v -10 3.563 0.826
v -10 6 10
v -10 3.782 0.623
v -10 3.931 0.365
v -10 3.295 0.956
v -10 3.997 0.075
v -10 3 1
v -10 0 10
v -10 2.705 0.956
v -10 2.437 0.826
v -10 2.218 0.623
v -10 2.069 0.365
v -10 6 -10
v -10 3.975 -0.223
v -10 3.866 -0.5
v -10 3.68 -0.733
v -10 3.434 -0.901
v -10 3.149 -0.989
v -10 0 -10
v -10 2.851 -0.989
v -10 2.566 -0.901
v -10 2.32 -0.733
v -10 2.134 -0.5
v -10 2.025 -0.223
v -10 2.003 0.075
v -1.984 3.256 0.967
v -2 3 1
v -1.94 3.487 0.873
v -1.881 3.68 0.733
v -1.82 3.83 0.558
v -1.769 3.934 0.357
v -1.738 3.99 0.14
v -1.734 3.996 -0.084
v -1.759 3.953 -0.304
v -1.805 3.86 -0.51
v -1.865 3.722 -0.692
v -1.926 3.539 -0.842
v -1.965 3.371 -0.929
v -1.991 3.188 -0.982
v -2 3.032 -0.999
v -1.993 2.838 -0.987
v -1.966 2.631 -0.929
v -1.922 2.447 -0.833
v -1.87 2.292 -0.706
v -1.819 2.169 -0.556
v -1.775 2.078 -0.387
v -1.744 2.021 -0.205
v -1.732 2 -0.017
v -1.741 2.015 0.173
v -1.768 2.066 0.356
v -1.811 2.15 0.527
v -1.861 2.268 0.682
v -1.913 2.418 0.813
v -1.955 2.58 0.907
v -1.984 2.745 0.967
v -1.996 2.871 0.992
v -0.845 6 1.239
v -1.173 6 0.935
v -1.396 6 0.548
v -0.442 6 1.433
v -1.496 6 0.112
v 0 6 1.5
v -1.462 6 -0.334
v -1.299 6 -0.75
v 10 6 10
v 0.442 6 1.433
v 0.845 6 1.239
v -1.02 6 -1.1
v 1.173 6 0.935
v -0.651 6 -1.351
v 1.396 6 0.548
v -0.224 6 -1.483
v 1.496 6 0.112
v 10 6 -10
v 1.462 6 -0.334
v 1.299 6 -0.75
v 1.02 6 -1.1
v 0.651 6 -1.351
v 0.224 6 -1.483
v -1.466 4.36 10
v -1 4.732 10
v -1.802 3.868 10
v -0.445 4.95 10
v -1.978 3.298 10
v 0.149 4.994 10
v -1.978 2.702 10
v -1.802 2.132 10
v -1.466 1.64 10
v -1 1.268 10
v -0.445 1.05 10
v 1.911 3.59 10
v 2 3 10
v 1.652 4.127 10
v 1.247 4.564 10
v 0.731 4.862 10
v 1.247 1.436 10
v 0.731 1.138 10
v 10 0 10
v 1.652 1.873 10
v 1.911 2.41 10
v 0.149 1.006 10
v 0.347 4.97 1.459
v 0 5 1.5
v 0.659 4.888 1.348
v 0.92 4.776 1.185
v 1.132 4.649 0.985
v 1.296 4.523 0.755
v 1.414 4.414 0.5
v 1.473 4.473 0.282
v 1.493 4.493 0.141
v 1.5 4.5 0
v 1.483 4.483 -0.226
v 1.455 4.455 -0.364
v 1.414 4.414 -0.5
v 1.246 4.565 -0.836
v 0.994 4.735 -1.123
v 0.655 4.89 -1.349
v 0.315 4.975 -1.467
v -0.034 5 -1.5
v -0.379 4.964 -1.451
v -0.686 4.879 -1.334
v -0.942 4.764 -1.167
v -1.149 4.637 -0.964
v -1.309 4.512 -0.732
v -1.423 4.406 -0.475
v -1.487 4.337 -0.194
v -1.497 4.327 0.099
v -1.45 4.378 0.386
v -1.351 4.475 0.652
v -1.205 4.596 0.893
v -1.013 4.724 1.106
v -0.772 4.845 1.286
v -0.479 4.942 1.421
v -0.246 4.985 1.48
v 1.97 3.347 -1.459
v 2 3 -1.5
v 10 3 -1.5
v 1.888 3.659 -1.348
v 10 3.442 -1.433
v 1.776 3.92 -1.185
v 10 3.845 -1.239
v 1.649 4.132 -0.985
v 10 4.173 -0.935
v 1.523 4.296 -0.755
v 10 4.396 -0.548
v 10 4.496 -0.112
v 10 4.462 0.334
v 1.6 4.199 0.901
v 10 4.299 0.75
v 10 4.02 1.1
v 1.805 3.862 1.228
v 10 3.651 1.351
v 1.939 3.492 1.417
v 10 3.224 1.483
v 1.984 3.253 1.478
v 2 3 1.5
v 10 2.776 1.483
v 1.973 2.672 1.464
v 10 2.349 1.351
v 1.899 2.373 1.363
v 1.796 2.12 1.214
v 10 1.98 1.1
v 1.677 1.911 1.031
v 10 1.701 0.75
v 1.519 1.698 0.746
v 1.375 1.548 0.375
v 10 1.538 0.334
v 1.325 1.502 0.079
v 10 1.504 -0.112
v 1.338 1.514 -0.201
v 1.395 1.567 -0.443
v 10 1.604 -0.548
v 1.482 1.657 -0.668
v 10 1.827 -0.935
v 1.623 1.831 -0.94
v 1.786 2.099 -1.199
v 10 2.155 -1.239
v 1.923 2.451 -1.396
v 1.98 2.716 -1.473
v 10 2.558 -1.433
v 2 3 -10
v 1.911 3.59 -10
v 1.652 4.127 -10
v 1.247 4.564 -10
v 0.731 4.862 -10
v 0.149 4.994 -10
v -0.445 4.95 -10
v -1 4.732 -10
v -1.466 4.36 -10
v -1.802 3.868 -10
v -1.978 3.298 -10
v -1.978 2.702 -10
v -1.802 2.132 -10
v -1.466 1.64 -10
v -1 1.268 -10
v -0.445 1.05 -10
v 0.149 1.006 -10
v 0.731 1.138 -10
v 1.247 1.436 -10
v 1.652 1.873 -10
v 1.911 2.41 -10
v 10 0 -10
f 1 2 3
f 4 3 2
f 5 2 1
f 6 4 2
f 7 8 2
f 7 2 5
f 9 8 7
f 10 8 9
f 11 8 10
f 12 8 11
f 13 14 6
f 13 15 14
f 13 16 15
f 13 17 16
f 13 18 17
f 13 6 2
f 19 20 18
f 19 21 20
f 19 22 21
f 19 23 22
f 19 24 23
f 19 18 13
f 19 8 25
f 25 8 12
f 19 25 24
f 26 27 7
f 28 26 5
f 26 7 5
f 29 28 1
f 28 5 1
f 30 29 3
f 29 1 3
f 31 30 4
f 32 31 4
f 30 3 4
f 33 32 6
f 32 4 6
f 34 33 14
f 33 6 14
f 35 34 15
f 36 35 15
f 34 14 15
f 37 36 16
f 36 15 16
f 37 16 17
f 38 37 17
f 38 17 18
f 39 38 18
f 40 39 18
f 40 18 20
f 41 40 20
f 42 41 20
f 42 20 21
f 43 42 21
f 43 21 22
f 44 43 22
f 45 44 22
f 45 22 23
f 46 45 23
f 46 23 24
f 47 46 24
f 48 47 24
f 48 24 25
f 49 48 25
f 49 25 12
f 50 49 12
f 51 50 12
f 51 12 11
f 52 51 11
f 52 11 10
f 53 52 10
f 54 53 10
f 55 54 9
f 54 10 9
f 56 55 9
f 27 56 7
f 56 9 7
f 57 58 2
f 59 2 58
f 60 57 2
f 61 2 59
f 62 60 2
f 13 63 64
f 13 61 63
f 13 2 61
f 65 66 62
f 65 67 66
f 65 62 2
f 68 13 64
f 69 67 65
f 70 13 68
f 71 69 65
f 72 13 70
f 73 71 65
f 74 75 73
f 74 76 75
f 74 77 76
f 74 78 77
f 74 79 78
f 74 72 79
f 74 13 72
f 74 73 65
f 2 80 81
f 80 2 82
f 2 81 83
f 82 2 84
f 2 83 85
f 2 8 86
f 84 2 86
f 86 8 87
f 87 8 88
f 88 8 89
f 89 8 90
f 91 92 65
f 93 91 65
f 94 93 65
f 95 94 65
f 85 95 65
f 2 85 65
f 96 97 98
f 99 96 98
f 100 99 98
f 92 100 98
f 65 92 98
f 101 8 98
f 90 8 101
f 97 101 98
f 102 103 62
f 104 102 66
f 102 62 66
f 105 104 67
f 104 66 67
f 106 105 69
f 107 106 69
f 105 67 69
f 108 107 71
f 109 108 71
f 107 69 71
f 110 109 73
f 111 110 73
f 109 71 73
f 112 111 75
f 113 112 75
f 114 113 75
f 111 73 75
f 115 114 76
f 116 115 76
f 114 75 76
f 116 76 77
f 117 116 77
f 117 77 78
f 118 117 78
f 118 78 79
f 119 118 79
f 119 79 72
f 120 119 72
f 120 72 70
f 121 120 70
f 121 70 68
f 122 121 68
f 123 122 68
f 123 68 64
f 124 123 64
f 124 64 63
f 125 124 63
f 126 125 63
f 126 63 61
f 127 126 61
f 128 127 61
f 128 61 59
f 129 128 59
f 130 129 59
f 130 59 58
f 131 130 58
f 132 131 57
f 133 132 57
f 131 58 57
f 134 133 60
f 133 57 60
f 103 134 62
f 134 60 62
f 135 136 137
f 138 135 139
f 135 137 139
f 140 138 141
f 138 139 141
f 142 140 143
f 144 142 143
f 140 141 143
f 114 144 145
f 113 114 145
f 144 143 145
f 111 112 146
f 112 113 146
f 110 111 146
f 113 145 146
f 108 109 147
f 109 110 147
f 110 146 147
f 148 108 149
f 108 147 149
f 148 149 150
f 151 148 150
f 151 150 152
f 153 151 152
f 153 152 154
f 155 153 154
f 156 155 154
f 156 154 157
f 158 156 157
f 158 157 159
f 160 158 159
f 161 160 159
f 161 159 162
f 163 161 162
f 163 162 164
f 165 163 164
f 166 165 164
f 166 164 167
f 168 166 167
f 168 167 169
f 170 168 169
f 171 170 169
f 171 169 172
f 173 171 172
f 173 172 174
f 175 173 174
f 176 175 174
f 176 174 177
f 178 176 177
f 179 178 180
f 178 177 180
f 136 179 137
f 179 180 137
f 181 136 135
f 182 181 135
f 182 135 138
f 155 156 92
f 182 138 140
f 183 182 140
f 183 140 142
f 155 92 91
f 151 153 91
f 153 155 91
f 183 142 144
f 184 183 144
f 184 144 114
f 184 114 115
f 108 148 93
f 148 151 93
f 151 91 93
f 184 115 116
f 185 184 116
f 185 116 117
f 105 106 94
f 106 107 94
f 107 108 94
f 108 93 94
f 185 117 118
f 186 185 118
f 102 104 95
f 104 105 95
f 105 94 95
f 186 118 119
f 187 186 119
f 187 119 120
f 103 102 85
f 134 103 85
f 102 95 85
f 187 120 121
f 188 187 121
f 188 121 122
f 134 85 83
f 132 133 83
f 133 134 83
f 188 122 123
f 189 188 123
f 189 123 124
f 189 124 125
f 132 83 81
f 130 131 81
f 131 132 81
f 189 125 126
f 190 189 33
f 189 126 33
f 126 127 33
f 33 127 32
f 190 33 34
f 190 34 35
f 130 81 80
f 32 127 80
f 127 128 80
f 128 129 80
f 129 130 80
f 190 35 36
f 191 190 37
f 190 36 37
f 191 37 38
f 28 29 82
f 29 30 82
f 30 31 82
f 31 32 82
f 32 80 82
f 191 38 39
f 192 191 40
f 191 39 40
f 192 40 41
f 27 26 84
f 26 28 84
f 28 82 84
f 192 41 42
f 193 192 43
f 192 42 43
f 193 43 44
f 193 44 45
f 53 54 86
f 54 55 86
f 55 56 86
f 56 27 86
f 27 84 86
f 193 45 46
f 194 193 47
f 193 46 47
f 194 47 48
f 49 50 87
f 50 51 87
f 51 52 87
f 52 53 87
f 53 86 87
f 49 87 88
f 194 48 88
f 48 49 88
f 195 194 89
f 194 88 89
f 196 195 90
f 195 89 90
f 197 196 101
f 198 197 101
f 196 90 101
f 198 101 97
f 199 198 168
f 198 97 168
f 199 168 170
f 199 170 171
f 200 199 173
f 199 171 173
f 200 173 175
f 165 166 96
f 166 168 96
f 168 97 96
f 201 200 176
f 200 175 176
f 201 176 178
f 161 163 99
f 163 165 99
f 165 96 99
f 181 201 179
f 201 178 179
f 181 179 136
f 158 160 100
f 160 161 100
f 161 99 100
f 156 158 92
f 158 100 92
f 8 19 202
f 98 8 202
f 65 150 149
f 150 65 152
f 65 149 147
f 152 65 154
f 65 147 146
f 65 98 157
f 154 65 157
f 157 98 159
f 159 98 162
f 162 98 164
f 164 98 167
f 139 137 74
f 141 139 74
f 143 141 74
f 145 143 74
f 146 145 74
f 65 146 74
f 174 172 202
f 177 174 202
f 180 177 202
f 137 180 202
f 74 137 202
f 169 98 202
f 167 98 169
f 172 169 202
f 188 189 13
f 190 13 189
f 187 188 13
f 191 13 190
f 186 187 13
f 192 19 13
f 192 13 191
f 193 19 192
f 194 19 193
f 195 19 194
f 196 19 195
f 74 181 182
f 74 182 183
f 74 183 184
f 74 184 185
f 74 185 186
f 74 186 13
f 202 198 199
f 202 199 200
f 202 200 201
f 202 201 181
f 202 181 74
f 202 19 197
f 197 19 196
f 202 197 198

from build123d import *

# Parameters (mm, degrees)
SKETCH1_W           = 20
SKETCH1_H           = 20
BOSS_EXTRUDE1_DEPTH = 6
SKETCH2_R           = 2
CUT_EXTRUDE1_DEPTH  = 20
SKETCH3_R           = 1.5
CUT_EXTRUDE2_DEPTH  = 3
SKETCH4_R           = 1.5
CUT_EXTRUDE3_DEPTH  = 9
SKETCH5_R           = 1
CUT_EXTRUDE4_DEPTH  = 9


with BuildPart() as part:
    # Sketch1 → Boss-Extrude1 (new body)
    with BuildSketch(Plane(origin=(0, 0, 0), x_dir=(1, 0, 0), z_dir=(0, 1, 0))):
        Rectangle(SKETCH1_W, SKETCH1_H)
    extrude(amount=BOSS_EXTRUDE1_DEPTH)

    # Sketch2 → Cut-Extrude1 (cut)
    with BuildSketch(Plane.XY.offset(10)):
        with Locations((0, 3)):
            Circle(SKETCH2_R)
    extrude(amount=-CUT_EXTRUDE1_DEPTH, mode=Mode.SUBTRACT)

    # Sketch3 → Cut-Extrude2 (cut)
    with BuildSketch(Plane(origin=(0, 6, 0), x_dir=(1, 0, 0), z_dir=(0, 1, 0))):
        with Locations(Location((0, 0, 0), (0, 0, 270))):
            Circle(SKETCH3_R)
    extrude(amount=-CUT_EXTRUDE2_DEPTH, mode=Mode.SUBTRACT)

    # Sketch4 → Cut-Extrude3 (cut)
    with BuildSketch(Plane(origin=(10, 0, 0), x_dir=(0, 0, -1), z_dir=(1, 0, 0))):
        with Locations((0, 3)):
            Circle(SKETCH4_R)
    extrude(amount=-CUT_EXTRUDE3_DEPTH, mode=Mode.SUBTRACT)

    # Sketch5 → Cut-Extrude4 (cut)
    with BuildSketch(Plane.ZY.offset(10)):
        with Locations((0, 3)):
            Circle(SKETCH5_R)
    extrude(amount=-CUT_EXTRUDE4_DEPTH, mode=Mode.SUBTRACT)


solid = part.part
